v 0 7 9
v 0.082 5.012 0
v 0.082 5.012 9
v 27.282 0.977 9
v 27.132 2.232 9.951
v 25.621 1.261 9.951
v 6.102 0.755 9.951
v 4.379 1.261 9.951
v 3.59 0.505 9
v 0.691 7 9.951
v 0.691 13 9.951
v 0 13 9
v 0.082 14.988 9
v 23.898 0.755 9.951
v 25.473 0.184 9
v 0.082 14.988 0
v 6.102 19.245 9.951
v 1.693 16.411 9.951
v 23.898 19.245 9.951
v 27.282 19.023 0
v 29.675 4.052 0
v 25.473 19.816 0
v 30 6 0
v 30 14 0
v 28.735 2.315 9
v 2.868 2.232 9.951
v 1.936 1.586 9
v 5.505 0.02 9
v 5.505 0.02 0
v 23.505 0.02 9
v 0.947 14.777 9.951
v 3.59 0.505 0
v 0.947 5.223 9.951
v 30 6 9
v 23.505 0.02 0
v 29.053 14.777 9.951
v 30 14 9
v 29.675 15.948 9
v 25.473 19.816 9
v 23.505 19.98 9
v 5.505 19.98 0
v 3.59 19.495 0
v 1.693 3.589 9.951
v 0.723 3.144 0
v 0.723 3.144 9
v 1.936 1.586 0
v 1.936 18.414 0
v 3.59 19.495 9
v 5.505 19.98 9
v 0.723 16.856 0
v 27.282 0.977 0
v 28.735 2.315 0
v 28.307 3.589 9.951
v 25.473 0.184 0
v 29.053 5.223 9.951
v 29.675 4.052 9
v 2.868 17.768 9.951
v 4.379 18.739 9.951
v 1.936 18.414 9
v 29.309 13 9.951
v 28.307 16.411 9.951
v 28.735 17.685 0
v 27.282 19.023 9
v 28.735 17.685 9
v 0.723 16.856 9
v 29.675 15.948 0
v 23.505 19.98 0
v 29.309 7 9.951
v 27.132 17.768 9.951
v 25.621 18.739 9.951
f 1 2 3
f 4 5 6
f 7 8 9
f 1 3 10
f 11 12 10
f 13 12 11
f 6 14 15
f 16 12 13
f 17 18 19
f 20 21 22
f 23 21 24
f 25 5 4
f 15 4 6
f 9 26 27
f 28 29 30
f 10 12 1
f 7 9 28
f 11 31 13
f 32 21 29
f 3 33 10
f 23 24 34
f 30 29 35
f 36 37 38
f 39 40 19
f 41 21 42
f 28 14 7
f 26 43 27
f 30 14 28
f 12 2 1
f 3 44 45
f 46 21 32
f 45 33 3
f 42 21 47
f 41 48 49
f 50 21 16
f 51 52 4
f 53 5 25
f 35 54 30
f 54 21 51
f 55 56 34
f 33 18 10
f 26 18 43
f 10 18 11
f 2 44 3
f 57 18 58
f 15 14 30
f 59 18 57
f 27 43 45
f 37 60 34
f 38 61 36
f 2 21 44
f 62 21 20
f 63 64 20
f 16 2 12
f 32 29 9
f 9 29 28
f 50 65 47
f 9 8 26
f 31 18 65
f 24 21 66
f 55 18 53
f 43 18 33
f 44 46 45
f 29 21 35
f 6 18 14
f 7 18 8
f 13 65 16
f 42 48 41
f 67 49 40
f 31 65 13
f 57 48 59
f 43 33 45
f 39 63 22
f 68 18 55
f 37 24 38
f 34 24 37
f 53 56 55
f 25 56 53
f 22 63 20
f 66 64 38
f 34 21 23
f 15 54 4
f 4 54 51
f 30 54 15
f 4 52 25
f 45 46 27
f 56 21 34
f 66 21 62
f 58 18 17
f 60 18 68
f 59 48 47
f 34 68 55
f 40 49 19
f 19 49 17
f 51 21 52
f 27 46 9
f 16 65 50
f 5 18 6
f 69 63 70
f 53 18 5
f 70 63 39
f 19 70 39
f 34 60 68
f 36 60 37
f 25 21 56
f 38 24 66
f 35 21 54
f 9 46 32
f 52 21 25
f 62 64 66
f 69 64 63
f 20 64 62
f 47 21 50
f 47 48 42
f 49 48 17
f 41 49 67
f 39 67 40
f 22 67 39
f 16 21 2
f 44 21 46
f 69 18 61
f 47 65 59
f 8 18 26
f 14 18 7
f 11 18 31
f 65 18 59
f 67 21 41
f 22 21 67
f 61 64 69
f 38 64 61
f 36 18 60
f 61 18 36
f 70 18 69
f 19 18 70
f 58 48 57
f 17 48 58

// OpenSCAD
topFilletRadius=1;
edgeFilletRadius=6;

boxVector=[30,20,10];
zeroVector=[0,0,0];

baseShape(boxVector,topFilletRadius,edgeFilletRadius);

module baseShape(boxVector,topFilletRadius,edgeFilletRadius)
{
    // Shorten variable names for the layout section
    bV=boxVector; 
    tFR=topFilletRadius;
    eFR=edgeFilletRadius;
    
    hull()
    {
	torusCorner([eFR+tFR, eFR+tFR, bV[2]-tFR], tFR, eFR);
	torusCorner([bV[0]-eFR-tFR, eFR+tFR, bV[2]-tFR], tFR, eFR);
	torusCorner([bV[0]-eFR-tFR, bV[1]-eFR-tFR, bV[2]-tFR], tFR, eFR);
	torusCorner([eFR+tFR, bV[1]-eFR-tFR, bV[2]-tFR], tFR, eFR);
	
	cylinderCorner([eFR, eFR, 0], eFR, bV[2]-tFR);
	cylinderCorner([bV[0]-eFR, eFR, 0], eFR, bV[2]-tFR);
	cylinderCorner([bV[0]-eFR,  bV[1]-eFR,	0], eFR, bV[2]-tFR);
	cylinderCorner([eFR,	bV[1]-eFR,  0], eFR, bV[2]-tFR);
    }
}

module torusCorner(torusCentreVector,topFilletRadius,edgeFilletRadius)
{
    translate(torusCentreVector)
    {
	torus(topFilletRadius,edgeFilletRadius);
    }
}

module torus(topFilletRadius,edgeFilletRadius)
{
    rotate_extrude()
    {
	translate ([edgeFilletRadius,0])
	{
	    circle(topFilletRadius);
	}
    }
}

module cylinderCorner(cylinderBaseVector,cylinderRadius,cylinderHeight)
{
    translate(cylinderBaseVector)
    {
	cylinder(r=cylinderRadius,h=cylinderHeight);
    }
}
